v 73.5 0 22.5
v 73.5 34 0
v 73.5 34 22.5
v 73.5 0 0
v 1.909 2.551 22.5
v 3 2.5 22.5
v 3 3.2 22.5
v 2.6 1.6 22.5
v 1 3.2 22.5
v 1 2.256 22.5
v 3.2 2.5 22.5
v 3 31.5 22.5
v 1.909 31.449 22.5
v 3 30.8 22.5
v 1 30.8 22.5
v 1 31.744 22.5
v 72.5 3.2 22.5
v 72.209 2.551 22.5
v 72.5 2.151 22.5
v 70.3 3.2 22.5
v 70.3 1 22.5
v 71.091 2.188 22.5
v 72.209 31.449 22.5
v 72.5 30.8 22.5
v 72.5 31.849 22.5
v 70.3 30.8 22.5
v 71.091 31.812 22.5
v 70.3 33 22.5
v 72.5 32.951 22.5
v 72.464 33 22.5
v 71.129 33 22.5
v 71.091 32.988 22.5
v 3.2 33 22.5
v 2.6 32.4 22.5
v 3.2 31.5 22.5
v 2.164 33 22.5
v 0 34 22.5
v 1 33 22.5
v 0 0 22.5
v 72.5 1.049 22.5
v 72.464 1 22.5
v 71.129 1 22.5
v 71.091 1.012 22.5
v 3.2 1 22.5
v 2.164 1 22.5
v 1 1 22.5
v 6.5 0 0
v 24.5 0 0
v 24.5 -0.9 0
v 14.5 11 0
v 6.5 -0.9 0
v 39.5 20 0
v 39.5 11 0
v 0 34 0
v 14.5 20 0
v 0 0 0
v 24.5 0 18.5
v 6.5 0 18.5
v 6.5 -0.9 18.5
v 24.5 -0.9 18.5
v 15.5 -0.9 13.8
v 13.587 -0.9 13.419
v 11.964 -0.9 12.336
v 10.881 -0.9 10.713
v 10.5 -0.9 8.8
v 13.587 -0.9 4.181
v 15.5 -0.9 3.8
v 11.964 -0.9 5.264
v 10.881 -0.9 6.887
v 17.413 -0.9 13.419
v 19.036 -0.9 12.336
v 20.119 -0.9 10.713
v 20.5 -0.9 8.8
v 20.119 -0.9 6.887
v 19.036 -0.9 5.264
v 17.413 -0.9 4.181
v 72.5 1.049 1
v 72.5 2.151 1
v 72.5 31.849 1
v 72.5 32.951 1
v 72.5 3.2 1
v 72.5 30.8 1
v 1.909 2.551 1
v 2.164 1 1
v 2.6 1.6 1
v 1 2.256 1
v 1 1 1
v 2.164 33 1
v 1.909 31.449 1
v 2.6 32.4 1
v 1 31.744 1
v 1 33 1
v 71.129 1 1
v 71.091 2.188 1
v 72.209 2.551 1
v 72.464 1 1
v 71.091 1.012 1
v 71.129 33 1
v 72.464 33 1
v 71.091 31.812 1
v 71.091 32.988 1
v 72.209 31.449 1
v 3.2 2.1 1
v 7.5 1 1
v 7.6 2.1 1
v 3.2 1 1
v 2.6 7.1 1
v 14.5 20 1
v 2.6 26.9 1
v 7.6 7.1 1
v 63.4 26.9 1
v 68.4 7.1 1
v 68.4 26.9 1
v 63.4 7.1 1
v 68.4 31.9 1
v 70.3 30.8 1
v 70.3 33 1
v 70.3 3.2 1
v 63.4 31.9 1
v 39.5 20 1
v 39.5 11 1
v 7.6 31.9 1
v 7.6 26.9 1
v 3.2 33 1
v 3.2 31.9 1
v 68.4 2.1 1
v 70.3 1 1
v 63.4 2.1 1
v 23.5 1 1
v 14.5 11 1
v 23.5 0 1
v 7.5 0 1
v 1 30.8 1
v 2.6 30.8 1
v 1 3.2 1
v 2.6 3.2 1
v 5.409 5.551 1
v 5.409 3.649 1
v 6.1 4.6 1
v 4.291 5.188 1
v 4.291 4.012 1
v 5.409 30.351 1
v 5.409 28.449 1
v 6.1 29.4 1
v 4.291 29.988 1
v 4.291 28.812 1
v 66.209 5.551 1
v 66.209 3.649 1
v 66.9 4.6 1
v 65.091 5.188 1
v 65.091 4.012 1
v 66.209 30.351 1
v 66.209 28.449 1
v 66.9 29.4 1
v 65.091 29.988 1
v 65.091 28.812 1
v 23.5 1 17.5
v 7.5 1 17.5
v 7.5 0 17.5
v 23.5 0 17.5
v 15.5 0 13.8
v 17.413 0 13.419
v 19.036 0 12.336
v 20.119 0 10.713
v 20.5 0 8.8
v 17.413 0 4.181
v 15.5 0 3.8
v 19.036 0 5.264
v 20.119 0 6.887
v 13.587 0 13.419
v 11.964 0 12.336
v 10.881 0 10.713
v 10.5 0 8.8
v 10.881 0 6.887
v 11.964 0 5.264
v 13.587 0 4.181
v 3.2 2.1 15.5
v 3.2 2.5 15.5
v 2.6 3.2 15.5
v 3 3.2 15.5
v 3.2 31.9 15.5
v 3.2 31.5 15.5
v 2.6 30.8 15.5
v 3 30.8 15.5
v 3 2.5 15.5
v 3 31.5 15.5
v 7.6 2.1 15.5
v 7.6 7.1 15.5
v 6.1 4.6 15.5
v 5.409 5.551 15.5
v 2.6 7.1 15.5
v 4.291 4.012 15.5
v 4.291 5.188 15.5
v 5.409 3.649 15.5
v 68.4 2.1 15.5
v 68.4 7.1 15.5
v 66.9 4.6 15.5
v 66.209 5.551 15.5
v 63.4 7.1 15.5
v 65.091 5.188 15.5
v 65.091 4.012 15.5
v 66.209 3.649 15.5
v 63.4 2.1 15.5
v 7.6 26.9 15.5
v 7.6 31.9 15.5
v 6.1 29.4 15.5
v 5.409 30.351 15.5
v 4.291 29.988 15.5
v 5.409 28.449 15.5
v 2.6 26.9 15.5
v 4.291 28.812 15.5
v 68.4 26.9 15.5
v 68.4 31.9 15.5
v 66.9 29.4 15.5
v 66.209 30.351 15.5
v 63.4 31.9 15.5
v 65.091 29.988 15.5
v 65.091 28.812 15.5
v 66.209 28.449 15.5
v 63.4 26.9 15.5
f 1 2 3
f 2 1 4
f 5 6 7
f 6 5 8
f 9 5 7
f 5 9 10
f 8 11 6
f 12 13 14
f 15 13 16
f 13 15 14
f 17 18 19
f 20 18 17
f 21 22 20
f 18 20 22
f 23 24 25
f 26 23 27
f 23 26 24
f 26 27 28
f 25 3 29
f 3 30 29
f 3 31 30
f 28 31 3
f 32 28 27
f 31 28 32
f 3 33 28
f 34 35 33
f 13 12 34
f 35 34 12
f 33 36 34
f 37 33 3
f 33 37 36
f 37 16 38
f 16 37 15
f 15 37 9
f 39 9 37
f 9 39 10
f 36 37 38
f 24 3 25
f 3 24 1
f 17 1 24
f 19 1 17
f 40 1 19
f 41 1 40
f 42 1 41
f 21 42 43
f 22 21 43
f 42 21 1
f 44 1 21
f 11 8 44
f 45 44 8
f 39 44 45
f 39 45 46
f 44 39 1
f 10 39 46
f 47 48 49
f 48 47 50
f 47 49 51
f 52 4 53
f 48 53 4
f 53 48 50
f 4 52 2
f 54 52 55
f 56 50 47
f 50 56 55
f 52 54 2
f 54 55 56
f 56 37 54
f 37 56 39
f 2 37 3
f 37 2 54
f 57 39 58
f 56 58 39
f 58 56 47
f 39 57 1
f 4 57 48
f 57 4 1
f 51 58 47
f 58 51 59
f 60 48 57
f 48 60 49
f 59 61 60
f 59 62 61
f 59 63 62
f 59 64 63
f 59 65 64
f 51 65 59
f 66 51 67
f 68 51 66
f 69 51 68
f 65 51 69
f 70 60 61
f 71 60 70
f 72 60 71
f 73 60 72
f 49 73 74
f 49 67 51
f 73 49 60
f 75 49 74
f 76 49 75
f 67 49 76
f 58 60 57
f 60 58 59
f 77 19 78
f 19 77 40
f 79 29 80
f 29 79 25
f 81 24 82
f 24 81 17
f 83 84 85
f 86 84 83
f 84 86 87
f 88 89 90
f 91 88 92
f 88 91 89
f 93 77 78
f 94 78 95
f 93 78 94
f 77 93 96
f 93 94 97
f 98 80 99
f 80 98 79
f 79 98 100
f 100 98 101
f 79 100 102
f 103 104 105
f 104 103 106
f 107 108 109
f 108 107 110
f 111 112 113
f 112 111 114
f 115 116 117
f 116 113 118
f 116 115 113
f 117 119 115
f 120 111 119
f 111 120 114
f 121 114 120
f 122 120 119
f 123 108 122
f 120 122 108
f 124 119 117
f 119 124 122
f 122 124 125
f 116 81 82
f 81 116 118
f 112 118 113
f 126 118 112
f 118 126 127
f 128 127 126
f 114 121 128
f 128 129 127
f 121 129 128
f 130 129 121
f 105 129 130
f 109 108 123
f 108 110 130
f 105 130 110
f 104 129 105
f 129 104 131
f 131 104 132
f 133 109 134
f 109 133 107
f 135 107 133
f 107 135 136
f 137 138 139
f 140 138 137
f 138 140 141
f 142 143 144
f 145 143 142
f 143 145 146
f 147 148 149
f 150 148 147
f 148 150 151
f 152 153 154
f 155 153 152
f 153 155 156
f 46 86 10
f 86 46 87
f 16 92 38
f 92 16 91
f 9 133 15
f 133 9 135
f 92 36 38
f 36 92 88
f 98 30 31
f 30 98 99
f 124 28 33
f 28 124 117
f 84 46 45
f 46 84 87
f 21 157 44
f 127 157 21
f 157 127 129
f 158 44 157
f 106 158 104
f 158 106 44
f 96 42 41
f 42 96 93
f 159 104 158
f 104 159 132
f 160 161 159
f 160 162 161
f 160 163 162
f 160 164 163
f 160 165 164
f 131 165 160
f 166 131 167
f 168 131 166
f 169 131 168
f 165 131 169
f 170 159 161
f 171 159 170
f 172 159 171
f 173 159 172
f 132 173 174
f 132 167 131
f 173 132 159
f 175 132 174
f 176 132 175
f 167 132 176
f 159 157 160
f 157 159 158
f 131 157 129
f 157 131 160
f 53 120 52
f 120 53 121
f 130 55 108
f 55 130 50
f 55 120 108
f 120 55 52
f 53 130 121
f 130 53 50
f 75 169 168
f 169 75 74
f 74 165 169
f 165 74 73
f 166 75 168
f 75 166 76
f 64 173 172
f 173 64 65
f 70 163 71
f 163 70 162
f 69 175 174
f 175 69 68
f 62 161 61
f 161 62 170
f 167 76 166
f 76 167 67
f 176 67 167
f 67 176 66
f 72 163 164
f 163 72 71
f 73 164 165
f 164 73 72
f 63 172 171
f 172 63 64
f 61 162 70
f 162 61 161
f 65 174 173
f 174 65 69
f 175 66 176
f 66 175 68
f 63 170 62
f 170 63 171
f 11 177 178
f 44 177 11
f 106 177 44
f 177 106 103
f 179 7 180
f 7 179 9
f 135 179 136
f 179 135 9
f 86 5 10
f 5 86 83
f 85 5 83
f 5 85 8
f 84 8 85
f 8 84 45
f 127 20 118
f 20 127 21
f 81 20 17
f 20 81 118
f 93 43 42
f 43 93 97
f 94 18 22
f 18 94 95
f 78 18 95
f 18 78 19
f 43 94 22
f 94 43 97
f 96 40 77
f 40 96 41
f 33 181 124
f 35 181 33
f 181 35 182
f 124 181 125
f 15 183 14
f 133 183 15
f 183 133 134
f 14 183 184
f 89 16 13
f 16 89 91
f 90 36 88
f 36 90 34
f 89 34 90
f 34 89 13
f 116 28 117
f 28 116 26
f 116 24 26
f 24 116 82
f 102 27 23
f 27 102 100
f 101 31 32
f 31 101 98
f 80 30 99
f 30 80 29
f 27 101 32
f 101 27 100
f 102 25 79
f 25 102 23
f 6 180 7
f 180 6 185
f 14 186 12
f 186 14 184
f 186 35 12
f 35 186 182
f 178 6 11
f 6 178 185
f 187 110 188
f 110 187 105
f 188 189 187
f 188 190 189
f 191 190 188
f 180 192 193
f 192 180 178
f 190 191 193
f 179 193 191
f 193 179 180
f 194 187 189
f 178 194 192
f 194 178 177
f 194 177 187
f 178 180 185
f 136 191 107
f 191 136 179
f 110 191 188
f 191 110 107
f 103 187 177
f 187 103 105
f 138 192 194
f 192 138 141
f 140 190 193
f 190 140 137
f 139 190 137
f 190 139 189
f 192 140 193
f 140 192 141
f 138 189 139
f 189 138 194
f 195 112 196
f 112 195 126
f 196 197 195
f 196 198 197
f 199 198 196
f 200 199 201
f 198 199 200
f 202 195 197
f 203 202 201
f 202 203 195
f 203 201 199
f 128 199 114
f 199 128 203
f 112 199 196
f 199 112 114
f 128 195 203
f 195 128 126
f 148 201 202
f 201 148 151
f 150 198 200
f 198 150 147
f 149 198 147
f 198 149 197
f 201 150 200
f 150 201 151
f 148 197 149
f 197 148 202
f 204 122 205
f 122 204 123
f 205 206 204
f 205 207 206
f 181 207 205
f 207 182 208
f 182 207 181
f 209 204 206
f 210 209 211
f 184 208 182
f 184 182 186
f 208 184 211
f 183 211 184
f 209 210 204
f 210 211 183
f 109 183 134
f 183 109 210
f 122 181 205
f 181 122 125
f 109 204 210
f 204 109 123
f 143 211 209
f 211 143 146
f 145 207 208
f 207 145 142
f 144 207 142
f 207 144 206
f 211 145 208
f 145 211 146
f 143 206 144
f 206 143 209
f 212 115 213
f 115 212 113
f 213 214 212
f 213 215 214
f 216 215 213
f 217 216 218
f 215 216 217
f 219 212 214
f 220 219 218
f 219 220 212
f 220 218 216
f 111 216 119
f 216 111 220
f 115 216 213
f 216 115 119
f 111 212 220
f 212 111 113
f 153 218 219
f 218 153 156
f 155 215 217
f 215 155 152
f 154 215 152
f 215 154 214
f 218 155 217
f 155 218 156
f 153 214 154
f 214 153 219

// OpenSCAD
width = 34;;
length = 73.5;
height = 22.5;
wall_thick=1;
board_len=64;
board_width=28;
board_pos=[length-board_len-2.5-3.5,(width-board_width)/2,0];
fuzz=.1;
difference()
{
    union()
    {
        //main block
        cube([length,width,height]);
        //power port blck
        translate([length-58-18/2,fuzz,0])
            rotate([90,0,0])
            cube([18,height-4,1]);
    }
    //main hole
    translate([wall_thick, wall_thick, wall_thick])
        cube([length-2*wall_thick,width-2*wall_thick,height]);
    //power block cutout
    translate([length-58-16/2,5,wall_thick])
            rotate([90,0,0])
            cube([16,height-6,5]);
    //screen cutout
    translate([length-34-25,11,-10])
        cube([25,9,999]);
    //power connector hole
    translate([length-58,-2,8.8])
        rotate([-90,0,0])
        cylinder(d=10,h=10,center=true);
}

difference()
{
union()
{
translate([1.6,1.6,0])
    lid_standoff();
translate([length-1.6,1.6,0])
    lid_standoff();
translate([1.6,width-1.6,0])
    lid_standoff();
translate([length-1.6,width-1.6,0])
    lid_standoff();
}
translate(board_pos+[-.5,-.5,1])
cube([board_len+1,board_width+1,999]);
}
translate(board_pos)
{
    translate([1.6,1.6,0])
        board_standoff();
    translate([board_len-1.6,1.6,0])
        board_standoff();
    translate([1.6,board_width-1.6,0])
        board_standoff();
    translate([board_len-1.6,board_width-1.6,0])
        board_standoff();
}

//
module board_standoff()
{
    difference()
    {
        translate([0,0,15.5/2])
            cube([5,5,15.5],center=true);
        translate([0,0,1])
            cylinder(d=2,h=999);
    }
}

module lid_standoff()
{
    difference()
    {
        translate([0,0,height/2])
            cube([3.2,3.2,height],center=true);
        translate([0,0,1])
            cylinder(d=2,h=999);
    }
}
